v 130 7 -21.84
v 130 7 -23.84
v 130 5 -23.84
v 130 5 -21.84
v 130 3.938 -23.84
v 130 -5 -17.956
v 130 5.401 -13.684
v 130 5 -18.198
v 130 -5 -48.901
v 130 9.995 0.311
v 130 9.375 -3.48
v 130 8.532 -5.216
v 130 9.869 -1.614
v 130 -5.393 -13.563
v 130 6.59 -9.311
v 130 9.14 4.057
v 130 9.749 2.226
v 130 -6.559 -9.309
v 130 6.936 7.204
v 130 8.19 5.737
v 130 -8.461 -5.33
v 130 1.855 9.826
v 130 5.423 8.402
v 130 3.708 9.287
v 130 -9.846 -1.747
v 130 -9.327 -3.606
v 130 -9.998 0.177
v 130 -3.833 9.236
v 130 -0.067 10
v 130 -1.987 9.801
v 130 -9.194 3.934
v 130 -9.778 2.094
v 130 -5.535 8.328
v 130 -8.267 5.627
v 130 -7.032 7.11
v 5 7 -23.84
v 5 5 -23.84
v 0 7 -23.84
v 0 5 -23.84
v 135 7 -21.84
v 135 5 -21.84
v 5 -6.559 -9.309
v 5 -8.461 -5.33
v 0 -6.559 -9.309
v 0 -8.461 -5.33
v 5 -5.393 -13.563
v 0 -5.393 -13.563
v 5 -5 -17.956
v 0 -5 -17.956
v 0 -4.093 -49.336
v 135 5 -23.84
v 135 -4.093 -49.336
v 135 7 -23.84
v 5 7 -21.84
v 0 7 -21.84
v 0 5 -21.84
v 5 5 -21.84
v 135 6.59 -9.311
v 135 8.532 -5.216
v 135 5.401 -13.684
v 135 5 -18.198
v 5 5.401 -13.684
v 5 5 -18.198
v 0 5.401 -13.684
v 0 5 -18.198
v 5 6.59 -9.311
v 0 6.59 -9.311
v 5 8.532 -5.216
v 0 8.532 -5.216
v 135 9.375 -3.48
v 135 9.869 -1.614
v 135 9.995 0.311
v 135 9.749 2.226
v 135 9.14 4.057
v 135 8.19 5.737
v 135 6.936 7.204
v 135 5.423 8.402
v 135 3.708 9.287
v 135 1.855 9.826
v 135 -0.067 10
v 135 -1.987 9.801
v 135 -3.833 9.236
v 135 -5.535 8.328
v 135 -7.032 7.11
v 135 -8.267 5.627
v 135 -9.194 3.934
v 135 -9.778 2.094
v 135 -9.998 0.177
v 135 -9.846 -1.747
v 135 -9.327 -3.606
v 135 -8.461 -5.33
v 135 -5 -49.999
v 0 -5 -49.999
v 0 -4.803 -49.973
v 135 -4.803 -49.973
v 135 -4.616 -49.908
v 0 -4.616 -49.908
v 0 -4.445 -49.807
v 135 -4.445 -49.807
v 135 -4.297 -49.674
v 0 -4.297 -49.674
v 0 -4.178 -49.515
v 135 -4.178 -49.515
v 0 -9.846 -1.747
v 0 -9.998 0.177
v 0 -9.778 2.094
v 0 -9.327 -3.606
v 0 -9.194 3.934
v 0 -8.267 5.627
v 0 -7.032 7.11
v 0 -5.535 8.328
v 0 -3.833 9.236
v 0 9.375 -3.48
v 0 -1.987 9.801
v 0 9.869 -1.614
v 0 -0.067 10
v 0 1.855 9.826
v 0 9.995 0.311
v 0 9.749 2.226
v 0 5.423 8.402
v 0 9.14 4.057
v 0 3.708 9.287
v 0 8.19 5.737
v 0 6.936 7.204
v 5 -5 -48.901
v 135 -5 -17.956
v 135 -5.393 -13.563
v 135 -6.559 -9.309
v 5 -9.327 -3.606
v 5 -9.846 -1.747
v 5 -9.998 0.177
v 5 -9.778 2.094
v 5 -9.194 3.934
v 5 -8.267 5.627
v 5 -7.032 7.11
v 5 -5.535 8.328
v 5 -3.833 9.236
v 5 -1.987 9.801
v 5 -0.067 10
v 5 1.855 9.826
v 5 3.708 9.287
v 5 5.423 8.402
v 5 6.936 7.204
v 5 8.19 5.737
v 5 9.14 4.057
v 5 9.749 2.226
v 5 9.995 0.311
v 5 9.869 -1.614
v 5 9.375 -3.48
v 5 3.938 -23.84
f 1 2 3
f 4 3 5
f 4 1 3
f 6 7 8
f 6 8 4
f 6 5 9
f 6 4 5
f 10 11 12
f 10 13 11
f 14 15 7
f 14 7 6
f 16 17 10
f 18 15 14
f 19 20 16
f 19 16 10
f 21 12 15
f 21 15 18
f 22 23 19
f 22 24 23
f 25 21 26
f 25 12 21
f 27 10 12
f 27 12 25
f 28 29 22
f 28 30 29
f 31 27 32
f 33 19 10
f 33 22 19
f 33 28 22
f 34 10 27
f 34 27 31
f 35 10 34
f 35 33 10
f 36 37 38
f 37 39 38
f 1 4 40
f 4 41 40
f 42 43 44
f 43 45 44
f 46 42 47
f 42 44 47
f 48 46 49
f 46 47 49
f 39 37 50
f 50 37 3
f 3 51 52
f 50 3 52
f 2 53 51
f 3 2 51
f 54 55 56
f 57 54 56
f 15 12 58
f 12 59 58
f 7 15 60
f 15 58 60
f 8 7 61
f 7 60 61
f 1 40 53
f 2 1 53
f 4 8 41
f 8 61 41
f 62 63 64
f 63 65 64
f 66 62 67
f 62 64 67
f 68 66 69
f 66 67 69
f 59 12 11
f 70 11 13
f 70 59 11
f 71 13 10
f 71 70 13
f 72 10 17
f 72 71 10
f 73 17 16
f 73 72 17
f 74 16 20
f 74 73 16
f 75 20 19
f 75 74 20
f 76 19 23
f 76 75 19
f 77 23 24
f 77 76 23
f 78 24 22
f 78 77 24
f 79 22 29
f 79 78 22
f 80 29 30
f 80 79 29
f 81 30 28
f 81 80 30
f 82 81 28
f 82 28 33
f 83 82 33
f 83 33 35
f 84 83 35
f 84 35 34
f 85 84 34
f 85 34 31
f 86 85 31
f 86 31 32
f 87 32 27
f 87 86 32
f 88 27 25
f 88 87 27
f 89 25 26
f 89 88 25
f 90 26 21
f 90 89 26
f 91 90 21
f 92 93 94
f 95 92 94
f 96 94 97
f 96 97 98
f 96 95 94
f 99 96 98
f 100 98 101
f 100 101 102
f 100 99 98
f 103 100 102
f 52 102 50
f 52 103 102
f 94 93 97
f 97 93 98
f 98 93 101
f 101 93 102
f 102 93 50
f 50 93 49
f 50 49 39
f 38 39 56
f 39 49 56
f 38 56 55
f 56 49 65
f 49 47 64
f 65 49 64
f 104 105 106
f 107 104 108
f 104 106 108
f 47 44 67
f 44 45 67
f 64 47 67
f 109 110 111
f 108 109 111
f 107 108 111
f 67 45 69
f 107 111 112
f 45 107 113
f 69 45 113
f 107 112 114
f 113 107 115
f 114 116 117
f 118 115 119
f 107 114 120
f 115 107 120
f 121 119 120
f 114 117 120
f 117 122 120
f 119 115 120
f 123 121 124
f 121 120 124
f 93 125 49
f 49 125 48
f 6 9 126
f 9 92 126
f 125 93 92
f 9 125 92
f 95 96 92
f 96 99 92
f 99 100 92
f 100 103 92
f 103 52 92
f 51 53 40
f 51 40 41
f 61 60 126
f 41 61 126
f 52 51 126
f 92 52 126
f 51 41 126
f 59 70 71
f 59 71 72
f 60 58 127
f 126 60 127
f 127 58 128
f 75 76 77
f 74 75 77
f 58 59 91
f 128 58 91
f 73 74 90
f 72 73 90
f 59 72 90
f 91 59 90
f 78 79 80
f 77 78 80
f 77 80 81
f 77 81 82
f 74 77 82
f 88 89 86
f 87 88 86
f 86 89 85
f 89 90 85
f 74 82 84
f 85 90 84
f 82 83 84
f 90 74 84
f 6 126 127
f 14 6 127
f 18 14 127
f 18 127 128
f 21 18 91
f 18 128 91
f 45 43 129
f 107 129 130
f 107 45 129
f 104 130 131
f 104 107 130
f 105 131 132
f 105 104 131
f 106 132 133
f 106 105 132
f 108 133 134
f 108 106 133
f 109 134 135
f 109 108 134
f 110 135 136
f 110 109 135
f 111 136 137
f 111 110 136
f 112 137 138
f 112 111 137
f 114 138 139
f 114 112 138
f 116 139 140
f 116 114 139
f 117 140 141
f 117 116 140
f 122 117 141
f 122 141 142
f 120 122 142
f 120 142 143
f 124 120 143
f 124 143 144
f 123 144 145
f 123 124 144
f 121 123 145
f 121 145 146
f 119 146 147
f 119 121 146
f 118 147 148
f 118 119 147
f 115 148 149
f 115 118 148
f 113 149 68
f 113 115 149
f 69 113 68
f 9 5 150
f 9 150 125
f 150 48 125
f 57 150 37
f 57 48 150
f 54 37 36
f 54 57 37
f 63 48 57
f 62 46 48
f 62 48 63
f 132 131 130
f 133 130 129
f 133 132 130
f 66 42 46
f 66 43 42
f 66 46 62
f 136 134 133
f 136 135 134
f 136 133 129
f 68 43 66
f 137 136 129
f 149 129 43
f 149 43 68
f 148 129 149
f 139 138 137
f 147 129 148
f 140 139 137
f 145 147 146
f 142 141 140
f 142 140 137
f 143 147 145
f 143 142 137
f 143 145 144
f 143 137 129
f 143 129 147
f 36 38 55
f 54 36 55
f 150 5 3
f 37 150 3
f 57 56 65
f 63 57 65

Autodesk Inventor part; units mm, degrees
ref_plane "YZ Plane" through (0, 0, 0) normal (1, 0, 0) x (0, 1, 0)
ref_plane "XZ Plane" through (0, 0, 0) normal (0, 1, 0) x (-1, 0, 0)
sketch "Boceto1" plane through (0, 0, 0) normal (1, 0, 0) x (0, 1, 0)
  arc A0 (8.5318, -5.2161) -> (-8.461, -5.3303) centre (0, 0) ccw
  line L0 (-5, -17.956) -> (-5, -50)
  line L1 (-5, -50) -> (-4.3301, -50)
  line L2 (5, -21.8397) -> (5, -18.1978)
  line L3 (0, 0) -> (8.6603, -5) construction
  line L4 (0, 0) -> (10, 0) construction
  line L5 (0, 0) -> (-8.6603, -5) construction
  line L6 (0, 0) -> (10, 0) construction
  arc A1 (8.6603, -5) -> (5, -18.1978) centre (30.624, -18.1978) ccw
  arc A2 (-5, -17.956) -> (-8.6603, -5) centre (-29.7601, -17.956) ccw
  line L7 (-4.3301, -50) -> (5, -23.8397)
  line L8 (5, -23.8397) -> (7, -23.8397)
  line L9 (7, -23.8397) -> (7, -21.8397)
  line L10 (7, -21.8397) -> (5, -21.8397)
  point P0 (-4.6651, -50)
  dimension "d3" = 30
  dimension "d4" = 210
  dimension "d8" = 50
  dimension "d16" = 10
extrude "Extrusión1" add sketch "Boceto1" along normal blind 5
sketch "Boceto3" plane through (5, 0, 0) normal (1, 0, 0) x (0, 0, -1)
  line L0 (23.8397, 5) -> (50, -4.3301)
  line L1 (23.8397, 3.9383) -> (48.9014, -5)
  line L2 (17.956, -5) -> (50, -5) projected
  line L3 (50, -4.3301) -> (50, -5)
  line L4 (48.9014, -5) -> (50, -5)
  line L5 (23.8397, 3.9383) -> (23.8397, 5)
  point P0 (0, 0)
  dimension "d12" = 1
extrude "Extrusión2" add sketch "Boceto3" along normal blind 125
ref_plane "Plano de trabajo1" through (67.5, 0, 0) normal (1, 0, 0) x (0, 0, -1)
mirror "Simetría1" about plane through (67.5, 0, 0) normal (1, 0, 0) of "Extrusión1"
fillet "Empalme1" radius 1 1 edges at (67.5, -4.3301, -50)
properties part number "cuchilla"
